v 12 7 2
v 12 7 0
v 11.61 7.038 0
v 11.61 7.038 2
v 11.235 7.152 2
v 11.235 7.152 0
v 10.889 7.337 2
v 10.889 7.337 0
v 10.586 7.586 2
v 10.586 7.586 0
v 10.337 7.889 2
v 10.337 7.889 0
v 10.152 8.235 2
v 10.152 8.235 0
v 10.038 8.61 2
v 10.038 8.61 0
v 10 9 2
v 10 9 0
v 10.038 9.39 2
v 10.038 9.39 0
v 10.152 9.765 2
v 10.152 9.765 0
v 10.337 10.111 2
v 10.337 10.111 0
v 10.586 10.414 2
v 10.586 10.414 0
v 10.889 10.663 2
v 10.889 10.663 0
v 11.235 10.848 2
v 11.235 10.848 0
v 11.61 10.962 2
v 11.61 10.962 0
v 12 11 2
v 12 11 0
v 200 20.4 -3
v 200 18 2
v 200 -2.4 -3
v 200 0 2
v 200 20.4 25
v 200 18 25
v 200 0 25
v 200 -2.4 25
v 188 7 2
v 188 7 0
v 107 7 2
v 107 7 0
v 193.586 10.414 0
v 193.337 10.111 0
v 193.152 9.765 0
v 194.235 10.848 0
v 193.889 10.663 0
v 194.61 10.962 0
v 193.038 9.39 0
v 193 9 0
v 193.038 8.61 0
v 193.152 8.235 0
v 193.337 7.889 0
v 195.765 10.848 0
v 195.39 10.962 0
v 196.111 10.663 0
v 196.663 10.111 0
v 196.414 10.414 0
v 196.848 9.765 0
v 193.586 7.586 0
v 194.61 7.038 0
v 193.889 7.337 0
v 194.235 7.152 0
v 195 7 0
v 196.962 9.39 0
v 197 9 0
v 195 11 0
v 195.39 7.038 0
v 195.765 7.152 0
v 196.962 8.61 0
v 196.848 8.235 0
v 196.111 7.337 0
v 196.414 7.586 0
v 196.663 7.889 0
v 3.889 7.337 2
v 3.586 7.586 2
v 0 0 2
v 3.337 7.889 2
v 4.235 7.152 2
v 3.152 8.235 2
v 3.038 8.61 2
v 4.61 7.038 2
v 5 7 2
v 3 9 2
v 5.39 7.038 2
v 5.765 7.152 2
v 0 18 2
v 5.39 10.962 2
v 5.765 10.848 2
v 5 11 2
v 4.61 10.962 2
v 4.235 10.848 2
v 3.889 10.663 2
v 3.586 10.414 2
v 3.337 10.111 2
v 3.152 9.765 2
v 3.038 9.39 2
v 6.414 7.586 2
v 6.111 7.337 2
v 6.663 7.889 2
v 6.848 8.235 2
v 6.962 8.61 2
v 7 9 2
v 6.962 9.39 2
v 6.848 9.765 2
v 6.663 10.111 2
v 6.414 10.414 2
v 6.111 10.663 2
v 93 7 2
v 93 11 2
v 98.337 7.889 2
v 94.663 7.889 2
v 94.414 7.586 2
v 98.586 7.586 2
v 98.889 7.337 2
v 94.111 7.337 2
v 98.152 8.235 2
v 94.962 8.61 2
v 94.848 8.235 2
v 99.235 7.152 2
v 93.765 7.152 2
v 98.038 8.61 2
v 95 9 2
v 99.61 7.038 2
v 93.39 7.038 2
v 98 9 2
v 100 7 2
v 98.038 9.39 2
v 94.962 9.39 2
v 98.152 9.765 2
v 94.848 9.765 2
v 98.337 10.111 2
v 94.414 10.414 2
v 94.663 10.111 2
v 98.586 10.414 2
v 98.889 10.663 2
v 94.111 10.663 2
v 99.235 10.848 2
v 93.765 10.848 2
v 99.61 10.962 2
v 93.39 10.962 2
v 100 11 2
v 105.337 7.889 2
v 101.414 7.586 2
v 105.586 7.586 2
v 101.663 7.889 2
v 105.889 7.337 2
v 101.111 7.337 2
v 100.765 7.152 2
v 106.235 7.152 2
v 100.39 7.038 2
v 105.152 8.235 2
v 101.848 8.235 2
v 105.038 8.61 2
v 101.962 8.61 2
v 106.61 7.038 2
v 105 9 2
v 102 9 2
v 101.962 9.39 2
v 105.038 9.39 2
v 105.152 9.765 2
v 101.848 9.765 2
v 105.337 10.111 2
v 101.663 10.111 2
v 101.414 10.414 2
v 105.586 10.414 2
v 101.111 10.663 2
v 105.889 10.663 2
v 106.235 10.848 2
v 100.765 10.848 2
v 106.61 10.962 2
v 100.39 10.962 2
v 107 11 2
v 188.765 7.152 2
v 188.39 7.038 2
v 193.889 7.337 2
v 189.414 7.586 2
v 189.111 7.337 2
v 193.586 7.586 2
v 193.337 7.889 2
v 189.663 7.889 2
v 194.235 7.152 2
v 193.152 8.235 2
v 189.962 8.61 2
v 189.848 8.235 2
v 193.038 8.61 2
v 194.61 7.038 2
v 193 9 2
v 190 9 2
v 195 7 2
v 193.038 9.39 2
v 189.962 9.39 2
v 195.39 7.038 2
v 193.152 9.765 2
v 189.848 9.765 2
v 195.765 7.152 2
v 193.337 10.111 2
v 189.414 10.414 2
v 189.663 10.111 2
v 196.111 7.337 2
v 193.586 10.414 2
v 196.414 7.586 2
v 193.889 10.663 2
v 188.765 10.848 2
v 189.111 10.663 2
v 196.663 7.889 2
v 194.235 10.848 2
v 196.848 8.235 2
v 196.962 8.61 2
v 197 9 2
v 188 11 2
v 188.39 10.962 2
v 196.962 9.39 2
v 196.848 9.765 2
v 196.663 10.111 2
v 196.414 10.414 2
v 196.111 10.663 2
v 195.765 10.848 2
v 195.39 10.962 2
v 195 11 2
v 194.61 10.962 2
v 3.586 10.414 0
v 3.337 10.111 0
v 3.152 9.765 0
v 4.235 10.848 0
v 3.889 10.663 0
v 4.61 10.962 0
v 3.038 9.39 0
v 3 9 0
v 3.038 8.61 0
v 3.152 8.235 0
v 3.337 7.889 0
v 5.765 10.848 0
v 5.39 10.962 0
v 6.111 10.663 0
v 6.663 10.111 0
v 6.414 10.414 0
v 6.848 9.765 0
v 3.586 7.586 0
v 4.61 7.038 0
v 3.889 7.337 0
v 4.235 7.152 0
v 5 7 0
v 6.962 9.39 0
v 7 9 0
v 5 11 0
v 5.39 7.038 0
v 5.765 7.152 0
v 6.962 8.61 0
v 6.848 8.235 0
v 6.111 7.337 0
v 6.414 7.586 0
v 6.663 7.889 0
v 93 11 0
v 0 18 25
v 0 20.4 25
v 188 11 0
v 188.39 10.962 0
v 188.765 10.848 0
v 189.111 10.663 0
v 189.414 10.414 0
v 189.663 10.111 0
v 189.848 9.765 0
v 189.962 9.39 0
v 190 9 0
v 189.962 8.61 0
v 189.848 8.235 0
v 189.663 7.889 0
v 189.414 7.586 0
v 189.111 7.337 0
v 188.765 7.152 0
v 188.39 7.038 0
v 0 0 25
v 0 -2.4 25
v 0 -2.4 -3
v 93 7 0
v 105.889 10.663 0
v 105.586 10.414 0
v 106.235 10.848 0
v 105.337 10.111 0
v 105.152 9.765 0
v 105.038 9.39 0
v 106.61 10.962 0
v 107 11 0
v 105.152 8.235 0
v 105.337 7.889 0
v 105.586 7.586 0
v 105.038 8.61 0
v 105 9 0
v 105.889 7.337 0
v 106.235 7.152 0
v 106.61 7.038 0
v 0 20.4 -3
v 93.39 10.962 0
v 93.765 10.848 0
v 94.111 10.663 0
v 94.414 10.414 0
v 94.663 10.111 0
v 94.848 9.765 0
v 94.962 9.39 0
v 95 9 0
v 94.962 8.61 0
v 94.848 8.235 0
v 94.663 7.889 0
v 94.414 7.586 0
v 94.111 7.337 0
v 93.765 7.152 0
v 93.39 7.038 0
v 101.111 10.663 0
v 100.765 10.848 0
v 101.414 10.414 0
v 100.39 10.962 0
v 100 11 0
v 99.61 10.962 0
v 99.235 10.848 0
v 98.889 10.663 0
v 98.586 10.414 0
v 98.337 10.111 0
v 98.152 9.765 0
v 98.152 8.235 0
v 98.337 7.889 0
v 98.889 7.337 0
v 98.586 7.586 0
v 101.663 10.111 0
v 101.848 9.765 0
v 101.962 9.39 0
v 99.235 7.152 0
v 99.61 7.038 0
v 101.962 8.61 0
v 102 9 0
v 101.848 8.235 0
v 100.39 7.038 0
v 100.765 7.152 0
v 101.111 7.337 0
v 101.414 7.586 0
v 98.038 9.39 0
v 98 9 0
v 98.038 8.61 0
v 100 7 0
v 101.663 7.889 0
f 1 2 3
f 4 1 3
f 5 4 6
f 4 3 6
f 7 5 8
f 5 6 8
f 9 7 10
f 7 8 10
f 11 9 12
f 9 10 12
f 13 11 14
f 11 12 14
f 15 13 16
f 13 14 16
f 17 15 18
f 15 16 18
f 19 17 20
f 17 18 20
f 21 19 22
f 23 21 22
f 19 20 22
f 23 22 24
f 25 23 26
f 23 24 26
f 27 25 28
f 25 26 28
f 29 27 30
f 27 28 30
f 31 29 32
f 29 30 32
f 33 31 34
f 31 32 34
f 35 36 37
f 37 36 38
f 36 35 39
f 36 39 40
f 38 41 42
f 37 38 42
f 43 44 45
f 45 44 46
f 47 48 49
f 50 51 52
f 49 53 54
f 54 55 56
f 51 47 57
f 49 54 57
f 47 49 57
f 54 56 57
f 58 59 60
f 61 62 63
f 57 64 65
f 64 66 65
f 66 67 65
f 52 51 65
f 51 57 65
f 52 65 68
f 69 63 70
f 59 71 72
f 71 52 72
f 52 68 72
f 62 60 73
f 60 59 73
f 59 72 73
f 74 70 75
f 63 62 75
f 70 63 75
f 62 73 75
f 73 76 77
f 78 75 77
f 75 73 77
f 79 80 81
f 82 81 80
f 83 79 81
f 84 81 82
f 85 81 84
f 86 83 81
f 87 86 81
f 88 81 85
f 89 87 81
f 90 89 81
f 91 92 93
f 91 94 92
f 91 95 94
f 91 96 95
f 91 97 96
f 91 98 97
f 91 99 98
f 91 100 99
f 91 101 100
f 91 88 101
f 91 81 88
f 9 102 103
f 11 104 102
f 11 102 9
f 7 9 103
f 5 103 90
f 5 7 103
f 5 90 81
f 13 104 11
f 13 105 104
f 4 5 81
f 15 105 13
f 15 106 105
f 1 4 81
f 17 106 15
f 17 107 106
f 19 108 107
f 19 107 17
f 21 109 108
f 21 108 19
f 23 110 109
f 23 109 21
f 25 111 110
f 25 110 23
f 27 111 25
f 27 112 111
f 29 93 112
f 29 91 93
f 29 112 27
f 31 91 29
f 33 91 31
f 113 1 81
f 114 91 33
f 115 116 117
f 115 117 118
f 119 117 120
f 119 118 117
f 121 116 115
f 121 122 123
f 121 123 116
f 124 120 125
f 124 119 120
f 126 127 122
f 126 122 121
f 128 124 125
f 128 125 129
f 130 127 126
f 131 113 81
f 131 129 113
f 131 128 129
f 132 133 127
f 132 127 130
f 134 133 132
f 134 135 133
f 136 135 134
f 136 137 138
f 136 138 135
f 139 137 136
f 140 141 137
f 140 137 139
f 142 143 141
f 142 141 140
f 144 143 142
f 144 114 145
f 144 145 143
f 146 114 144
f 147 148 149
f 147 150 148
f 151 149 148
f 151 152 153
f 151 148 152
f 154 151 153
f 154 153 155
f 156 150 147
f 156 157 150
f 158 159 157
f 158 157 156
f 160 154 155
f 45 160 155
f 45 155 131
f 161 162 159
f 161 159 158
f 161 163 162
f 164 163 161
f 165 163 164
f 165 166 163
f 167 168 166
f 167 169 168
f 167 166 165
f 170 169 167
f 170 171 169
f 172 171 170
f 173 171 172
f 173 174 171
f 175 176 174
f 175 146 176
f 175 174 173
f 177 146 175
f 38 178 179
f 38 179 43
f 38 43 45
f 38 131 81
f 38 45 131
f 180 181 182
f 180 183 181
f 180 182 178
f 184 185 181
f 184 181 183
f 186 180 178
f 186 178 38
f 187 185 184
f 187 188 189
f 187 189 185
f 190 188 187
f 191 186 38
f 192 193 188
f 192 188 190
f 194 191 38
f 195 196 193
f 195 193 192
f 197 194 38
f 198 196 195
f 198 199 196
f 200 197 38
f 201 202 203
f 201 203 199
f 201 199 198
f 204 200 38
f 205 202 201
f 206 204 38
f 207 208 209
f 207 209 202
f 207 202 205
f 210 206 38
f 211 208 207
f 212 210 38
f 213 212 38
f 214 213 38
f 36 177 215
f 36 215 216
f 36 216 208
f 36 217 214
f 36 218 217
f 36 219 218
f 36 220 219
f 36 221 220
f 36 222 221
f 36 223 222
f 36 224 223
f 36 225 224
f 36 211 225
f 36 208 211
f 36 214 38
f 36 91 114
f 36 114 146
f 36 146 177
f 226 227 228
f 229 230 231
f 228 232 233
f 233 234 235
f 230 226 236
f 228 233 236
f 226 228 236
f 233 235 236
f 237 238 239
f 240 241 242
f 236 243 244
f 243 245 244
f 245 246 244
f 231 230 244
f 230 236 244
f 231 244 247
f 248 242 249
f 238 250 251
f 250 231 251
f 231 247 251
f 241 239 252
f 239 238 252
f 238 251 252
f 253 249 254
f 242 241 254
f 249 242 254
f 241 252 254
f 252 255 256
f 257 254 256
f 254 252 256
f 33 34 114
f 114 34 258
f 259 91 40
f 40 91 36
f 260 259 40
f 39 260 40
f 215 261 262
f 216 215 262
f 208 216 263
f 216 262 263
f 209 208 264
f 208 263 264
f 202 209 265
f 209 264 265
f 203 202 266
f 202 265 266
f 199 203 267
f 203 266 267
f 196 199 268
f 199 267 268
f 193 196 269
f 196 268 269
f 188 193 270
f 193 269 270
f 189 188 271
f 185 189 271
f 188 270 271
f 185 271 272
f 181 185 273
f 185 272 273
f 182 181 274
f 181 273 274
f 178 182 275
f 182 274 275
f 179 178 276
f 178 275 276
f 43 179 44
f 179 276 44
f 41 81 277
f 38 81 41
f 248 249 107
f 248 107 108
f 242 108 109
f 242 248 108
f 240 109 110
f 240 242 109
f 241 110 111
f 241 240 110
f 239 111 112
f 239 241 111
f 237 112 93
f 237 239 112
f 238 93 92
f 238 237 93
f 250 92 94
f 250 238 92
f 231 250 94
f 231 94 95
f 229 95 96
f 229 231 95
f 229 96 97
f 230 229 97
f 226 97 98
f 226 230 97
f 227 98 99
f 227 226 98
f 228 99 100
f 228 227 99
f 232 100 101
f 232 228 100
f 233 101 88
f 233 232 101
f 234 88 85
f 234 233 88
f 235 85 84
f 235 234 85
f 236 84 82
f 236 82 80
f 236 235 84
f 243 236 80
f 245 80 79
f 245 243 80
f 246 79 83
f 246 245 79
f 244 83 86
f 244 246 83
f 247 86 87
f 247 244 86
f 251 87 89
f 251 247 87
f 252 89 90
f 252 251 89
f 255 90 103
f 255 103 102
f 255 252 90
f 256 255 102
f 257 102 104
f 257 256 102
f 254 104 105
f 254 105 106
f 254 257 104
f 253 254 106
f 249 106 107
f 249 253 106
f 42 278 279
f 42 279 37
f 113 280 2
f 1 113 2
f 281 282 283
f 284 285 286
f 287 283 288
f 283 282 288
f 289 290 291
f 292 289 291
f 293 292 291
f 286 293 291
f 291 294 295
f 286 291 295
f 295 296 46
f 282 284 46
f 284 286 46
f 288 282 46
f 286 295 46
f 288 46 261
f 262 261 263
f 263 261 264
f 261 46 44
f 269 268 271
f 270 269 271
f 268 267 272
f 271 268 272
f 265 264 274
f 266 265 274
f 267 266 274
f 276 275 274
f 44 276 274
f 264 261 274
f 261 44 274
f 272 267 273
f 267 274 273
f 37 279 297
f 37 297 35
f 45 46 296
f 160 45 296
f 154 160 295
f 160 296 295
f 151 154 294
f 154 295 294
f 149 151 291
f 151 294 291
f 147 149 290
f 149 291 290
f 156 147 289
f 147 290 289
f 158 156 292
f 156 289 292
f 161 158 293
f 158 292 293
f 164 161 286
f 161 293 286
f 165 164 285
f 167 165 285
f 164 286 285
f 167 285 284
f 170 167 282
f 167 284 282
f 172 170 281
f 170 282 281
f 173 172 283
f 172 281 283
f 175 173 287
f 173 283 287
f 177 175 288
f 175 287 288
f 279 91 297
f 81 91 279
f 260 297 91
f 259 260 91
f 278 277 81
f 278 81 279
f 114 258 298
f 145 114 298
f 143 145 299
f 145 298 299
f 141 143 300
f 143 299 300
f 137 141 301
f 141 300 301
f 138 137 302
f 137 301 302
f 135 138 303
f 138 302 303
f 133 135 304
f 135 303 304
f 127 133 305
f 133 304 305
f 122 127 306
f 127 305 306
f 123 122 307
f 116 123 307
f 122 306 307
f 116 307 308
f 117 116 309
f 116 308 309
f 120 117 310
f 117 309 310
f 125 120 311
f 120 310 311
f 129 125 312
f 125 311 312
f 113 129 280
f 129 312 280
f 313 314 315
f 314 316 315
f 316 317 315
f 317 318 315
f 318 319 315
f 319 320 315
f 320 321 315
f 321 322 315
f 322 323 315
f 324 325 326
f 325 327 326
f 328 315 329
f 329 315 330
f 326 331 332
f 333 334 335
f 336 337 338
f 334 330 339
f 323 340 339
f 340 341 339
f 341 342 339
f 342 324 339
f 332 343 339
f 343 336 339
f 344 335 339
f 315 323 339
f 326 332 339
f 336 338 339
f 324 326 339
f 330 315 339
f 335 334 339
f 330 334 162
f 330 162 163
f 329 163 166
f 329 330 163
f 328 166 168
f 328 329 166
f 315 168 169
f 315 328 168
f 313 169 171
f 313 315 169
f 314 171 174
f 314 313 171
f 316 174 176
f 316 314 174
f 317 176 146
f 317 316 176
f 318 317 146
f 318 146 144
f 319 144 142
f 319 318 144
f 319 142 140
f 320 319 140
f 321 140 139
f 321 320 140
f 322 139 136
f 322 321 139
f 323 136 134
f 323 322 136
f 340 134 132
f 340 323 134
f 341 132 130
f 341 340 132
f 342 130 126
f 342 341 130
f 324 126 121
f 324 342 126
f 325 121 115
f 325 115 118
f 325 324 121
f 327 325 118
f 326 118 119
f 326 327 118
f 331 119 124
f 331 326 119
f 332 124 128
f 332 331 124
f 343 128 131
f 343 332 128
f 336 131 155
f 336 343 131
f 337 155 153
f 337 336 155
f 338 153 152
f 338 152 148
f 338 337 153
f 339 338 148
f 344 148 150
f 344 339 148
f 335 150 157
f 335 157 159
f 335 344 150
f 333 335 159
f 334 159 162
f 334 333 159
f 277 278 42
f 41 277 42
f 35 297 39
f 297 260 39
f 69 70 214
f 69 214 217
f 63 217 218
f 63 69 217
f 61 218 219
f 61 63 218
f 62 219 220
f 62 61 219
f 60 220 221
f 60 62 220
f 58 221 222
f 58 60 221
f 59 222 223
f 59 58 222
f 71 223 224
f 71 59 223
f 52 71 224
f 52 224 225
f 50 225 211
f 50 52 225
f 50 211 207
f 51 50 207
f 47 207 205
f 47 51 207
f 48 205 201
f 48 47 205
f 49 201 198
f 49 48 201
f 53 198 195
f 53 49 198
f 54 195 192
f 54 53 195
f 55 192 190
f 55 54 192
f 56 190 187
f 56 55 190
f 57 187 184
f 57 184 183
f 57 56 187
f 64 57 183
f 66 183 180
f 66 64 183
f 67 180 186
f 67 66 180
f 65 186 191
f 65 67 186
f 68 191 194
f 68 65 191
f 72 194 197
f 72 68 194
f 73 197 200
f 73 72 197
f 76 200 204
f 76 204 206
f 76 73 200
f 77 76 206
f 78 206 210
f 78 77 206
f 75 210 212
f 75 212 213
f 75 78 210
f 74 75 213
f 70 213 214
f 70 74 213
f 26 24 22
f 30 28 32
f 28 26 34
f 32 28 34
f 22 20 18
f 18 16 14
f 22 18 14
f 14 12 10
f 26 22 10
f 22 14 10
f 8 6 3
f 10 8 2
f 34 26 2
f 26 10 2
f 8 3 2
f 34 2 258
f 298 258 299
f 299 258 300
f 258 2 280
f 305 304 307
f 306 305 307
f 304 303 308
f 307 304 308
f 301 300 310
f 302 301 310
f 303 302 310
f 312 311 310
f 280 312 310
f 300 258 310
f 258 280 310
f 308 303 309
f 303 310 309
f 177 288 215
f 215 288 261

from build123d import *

# Parameters (mm, degrees)
F0_W     = 200
F0_H     = 18
F0_R     = 2
F1_DEPTH = 2
F2_W     = 200
F2_H     = 2.4
F3_DEPTH = 25
F4_W     = 200
F4_H     = 22.8
F5_DEPTH = 3


with BuildPart() as f1:
    # F0 (on Top) → F1 (new body)
    with BuildSketch(Plane.XY):
        with Locations((100, 9)):
            Rectangle(F0_W, F0_H)
        with Locations((5, 9)):
            Circle(F0_R, mode=Mode.SUBTRACT)
        with BuildLine():
            Line((12, 11), (93, 11))
            ThreePointArc((93, 11), (95, 9), (93, 7))
            Line((93, 7), (12, 7))
            ThreePointArc((12, 7), (10, 9), (12, 11))
        make_face(mode=Mode.SUBTRACT)
        with Locations((100, 9)):
            Circle(F0_R, mode=Mode.SUBTRACT)
        with BuildLine():
            Line((107, 11), (188, 11))
            ThreePointArc((188, 11), (190, 9), (188, 7))
            Line((188, 7), (107, 7))
            ThreePointArc((107, 7), (105, 9), (107, 11))
        make_face(mode=Mode.SUBTRACT)
        with Locations((195, 9)):
            Circle(F0_R, mode=Mode.SUBTRACT)
    extrude(amount=F1_DEPTH)

    # F2 (on face) → F3 (join)
    with BuildSketch(Plane(origin=(0, 0, 0), x_dir=(1, 0, 0), z_dir=(0, 0, -1))):
        with Locations((100, 1.2)):
            Rectangle(F2_W, F2_H)
        with Locations((100, -19.2)):
            Rectangle(F2_W, F2_H)
    extrude(amount=-F3_DEPTH)

    # F4 (on face) → F5 (join)
    with BuildSketch(Plane(origin=(0, 0, 0), x_dir=(1, 0, 0), z_dir=(0, 0, -1))):
        with Locations((100, -9)):
            Rectangle(F4_W, F4_H)
    extrude(amount=F5_DEPTH)


solid = f1.part
